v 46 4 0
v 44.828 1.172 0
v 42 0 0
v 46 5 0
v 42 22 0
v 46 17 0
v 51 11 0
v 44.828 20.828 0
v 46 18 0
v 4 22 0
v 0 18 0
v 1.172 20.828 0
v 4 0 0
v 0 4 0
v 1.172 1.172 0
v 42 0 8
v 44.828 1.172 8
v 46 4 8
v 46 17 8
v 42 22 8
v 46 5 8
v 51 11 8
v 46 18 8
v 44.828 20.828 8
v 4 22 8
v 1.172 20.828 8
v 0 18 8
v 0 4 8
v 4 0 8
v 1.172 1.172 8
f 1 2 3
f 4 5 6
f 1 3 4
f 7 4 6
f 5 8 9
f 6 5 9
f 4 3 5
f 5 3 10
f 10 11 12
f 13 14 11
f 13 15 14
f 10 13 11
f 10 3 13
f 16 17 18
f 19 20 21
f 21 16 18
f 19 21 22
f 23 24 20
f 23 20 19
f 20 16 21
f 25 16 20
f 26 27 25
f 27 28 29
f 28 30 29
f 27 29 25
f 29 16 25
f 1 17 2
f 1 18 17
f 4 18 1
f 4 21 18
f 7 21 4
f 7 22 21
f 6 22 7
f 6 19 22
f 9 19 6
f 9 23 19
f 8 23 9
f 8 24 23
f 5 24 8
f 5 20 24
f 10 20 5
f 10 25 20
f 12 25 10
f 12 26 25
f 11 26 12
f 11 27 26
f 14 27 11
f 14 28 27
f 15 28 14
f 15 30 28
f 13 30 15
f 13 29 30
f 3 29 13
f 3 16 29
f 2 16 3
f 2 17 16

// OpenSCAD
$fn = 32;

// ----------------------------------------------------------------------
// Ratchet pawl: 46 x 22 mm body, beak 5 mm с правого торца
// ----------------------------------------------------------------------

// --- parameters (mm) ---
profile_height = 8;       // extrusion height
profile_points = 15;      // points of the closed outline

profile = [[0, 4], [1.172, 1.172], [4, 0], [42, 0], [44.828, 1.172], [46, 4], [46, 5], [51, 11], [46, 17], [46, 18], [44.828, 20.828], [42, 22], [4, 22], [1.172, 20.828], [0, 18]];  // single closed polygon, 15 points, counter clockwise

// --- the one profile operation ---
linear_extrude(height = profile_height) polygon(points = profile);
